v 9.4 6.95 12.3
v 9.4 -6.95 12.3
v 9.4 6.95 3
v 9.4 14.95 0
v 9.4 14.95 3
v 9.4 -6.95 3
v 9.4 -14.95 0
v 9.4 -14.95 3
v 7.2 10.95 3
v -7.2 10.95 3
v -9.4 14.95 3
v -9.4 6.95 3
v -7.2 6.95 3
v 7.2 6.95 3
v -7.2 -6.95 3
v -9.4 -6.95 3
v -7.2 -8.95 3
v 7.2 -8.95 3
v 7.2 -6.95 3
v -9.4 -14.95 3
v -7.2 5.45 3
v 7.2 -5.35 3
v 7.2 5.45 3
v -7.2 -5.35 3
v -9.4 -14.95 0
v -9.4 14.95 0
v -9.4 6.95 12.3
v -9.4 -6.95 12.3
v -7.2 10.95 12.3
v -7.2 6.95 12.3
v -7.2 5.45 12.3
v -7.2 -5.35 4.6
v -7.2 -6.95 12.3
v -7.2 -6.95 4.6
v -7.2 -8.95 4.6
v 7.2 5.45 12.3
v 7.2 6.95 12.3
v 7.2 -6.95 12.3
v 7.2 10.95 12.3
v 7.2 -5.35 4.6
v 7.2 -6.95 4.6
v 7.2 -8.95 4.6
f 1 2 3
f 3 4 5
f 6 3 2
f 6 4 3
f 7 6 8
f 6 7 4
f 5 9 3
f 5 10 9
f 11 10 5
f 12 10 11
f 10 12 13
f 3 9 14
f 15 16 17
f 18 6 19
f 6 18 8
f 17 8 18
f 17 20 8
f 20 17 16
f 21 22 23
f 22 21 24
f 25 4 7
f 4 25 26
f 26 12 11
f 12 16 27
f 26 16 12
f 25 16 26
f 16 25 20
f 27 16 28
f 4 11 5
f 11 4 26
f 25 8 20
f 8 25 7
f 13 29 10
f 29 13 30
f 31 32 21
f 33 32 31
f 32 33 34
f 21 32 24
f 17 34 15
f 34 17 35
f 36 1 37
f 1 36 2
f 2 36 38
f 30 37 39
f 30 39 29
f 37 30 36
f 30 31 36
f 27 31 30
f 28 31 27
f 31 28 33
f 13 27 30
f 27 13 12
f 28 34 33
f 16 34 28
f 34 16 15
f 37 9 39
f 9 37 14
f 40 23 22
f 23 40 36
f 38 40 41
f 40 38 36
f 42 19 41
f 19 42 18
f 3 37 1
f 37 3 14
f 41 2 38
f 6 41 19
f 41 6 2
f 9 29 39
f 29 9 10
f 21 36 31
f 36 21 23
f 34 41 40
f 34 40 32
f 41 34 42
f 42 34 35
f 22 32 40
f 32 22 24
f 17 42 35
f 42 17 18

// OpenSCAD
// WAGO 221-412 snap mount (single) - parametric
// Dimensions sourced from WAGO datasheet (width ~13.2 mm, height ~8.6 mm, depth ~18.8 mm).
// Adjust parameters below as needed.

//////////////////////
// Parameters
//////////////////////
wago_width = 13.2;      // nominal connector width (mm)
wago_height = 8.6;      // nominal connector height (mm)
wago_depth = 18.8;      // nominal connector depth/length (mm)

clearance = 0.6;        // radial clearance for snap-fit (mm)
side_wall_thickness = 2.2; // thickness of side walls (mm)
base_thickness = 3.0;   // thickness of base plate (mm)
retention_lip = 1.6;    // front lip that prevents connector pulling forward (mm)
rear_stop = 1.5;        // rear overhang behind connector (mm)

mount_hole_d = 3.2;     // thru-hole for M3 screws (slightly larger) (mm)
countersink = true;     // countersink for flat-head M3? (simple chamfer)
cs_diam = 6.5;          // countersink diameter (mm)
cs_depth = 1.5;         // countersink depth (mm)
mount_spacing = 30;     // center-to-center spacing of the two mounting holes (mm)
mount_offset_y = 0;     // offset of mount holes in Y relative to connector center

fillet_radius = 1.2;    // optional fillet radius on corners (not a true fillet; uses minkowski)
use_minkowski = false;  // set true if you want rounded corners (may be slower)

//////////////////////
// Derived dims
//////////////////////
slot_w = wago_width + 2*clearance;
slot_h = wago_height + clearance;
slot_d = wago_depth + rear_stop + retention_lip;

total_width = slot_w + 2*side_wall_thickness;
total_depth = slot_d + 8; // extra for mount front/back clearance
total_height = base_thickness + slot_h + 2; // little extra

mount_y = mount_offset_y;
mount_x_left = -mount_spacing/2;
mount_x_right = mount_spacing/2;
mount_z = 0.1; // through holes go through base

//////////////////////
// Modules
//////////////////////
module base_plate() {
    difference() {
        translate([ -total_width/2, -total_depth/2, 0 ])
            cube([ total_width, total_depth, base_thickness ], center=false);
        // optional countersink holes
        translate([ mount_x_left, mount_y, -1 ])
            rotate([90,0,0])
                if (countersink) difference() {
                    cylinder(h = base_thickness + 2, r = cs_diam/2, $fn=64);
                    translate([0,0,-cs_depth])
                        cylinder(h = base_thickness + 4, r = mount_hole_d/2, $fn=32);
                } else translate([0,0,0]) cylinder(h=base_thickness+2, r = mount_hole_d/2, $fn=32);
        translate([ mount_x_right, mount_y, -1 ])
            rotate([90,0,0])
                if (countersink) difference() {
                    cylinder(h = base_thickness + 2, r = cs_diam/2, $fn=64);
                    translate([0,0,-cs_depth])
                        cylinder(h = base_thickness + 4, r = mount_hole_d/2, $fn=32);
                } else translate([0,0,0]) cylinder(h=base_thickness+2, r = mount_hole_d/2, $fn=32);
    }
}

module side_walls_and_slot() {
    // left wall
    translate([ -total_width/2, -slot_d/2 + 4, base_thickness ])
        cube([ side_wall_thickness, slot_d-8, slot_h+0.1 ]);
    // right wall
    translate([ total_width/2 - side_wall_thickness, -slot_d/2 + 4, base_thickness ])
        cube([ side_wall_thickness, slot_d-8, slot_h+0.1 ]);
    // back wall (rear stop)
    translate([ -total_width/2 + side_wall_thickness, slot_d/2 - rear_stop - 4, base_thickness ])
        cube([ slot_w, rear_stop + 4, slot_h + 0.1 ]);
    // retention lip at front
    translate([ -slot_w/2, -slot_d/2 + 2, base_thickness ])
        cube([ slot_w, retention_lip + 2, retention_lip ]);
}

module connector_cutout() {
    // cutout where the connector sits (centered)
    translate([ -slot_w/2, -wago_depth/2 + clearance/2, base_thickness ])
        cube([ slot_w, wago_depth + clearance, slot_h ]);
}

//////////////////////
// Assemble
//////////////////////
if (!use_minkowski) {
    // straightforward assembly
    union() {
        base_plate();
        side_walls_and_slot();
        // Subtract internal cavity for connector
        difference() {
            // no-op union to hold shapes before subtract
            translate([0,0,0]) {}
            translate([0,0,0]) 
                connector_cutout();
        }
    }
} else {
    // with rounded outer corners (minkowski)
    minkowski() {
        union() {
            base_plate();
            side_walls_and_slot();
            difference() {
                translate([0,0,0]) {}
                translate([0,0,0]) connector_cutout();
            }
        }
        sphere(r=fillet_radius, $fn=32);
    }
}

// Show optional debug dimensions (comment/uncomment to view)
// translate([0,0,base_thickness+slot_h+5]) text(str("slot_w=" + str(slot_w) + "mm"), size=3, halign="center");
